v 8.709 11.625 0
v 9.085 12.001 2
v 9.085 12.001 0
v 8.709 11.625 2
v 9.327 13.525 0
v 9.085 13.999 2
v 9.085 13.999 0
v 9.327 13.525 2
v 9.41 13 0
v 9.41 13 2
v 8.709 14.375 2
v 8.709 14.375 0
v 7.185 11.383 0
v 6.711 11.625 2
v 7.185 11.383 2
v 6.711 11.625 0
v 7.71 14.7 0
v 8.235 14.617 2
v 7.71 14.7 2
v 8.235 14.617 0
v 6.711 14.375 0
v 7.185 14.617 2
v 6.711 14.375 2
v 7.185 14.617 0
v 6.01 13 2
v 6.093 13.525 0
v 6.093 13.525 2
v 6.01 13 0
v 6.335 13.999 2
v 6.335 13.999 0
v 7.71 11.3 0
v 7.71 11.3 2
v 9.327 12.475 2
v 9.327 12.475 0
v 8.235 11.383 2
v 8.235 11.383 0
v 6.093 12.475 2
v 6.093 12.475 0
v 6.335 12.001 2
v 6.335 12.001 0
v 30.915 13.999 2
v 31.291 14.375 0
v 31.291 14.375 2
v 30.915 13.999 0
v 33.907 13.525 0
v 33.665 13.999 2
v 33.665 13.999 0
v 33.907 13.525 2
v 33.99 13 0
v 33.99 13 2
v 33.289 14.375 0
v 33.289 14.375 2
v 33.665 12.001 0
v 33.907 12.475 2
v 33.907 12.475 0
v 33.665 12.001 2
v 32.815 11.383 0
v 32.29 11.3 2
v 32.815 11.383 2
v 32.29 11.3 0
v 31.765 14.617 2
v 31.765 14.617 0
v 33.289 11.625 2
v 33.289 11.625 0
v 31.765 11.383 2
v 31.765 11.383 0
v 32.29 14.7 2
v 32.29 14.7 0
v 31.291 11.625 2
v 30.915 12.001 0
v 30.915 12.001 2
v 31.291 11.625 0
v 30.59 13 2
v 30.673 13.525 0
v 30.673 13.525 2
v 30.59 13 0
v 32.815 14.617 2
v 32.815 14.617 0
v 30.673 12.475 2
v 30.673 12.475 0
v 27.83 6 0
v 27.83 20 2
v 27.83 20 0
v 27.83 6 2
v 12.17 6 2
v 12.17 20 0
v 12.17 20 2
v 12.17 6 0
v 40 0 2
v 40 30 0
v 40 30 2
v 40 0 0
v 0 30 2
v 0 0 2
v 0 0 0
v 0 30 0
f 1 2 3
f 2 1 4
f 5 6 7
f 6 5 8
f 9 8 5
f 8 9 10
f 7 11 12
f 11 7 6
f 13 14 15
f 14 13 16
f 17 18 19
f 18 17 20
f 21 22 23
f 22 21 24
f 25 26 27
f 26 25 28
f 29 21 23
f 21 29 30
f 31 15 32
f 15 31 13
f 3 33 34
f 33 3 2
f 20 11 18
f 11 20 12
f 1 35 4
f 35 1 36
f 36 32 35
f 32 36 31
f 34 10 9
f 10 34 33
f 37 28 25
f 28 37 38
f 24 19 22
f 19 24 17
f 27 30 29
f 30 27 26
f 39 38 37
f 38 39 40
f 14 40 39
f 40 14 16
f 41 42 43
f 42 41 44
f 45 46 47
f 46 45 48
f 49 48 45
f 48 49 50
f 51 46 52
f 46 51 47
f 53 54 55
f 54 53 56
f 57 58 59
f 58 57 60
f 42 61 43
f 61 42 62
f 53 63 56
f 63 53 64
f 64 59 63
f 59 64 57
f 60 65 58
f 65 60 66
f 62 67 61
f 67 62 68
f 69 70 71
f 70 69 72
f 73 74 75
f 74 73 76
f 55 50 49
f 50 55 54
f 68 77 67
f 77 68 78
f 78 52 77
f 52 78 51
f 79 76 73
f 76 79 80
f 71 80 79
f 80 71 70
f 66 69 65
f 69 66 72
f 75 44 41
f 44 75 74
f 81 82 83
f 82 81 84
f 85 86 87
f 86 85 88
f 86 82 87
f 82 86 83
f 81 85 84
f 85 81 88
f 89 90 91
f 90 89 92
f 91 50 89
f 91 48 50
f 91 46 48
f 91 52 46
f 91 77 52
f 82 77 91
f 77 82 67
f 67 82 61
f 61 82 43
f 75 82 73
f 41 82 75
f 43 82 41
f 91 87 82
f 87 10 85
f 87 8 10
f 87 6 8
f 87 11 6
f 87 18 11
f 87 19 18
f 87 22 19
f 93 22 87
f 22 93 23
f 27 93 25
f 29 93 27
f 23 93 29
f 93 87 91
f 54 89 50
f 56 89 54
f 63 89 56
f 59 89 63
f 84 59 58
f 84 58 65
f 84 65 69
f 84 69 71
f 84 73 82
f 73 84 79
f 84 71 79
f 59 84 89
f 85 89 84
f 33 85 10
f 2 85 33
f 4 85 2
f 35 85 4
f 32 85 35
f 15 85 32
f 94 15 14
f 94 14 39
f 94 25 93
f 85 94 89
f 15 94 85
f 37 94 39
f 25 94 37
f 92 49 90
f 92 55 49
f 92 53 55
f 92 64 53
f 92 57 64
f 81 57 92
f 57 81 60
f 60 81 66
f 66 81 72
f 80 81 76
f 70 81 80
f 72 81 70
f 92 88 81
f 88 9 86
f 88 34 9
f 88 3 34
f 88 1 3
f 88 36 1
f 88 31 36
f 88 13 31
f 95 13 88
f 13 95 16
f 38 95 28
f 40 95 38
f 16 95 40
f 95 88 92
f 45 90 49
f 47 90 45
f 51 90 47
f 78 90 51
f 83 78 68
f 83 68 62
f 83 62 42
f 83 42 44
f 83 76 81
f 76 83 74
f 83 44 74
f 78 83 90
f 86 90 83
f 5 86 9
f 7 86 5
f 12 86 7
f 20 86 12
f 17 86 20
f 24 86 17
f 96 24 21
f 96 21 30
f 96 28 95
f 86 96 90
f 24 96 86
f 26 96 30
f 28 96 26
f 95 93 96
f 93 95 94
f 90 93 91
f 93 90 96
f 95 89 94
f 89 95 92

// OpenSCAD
// file: bbs_switches.scad
//-------------------------------------------------------------------------------------
// Model for a SPDT switch from AdaFruit (Product ID 3221)
//
// The switch module can be used for checking for interferance.
// The cutout module is to be used for making a hole for mounting the switch in a panel.
//

module bbs_spdt_switch()
{
    translate([-13/2, -7.88/2, -9.56]) difference()
    {
        union()
        {
            cube([13, 7.88, 9.56]);
            translate([1.59, 2.17, -3.75]) cube([0.73, 7.88-2.17*2, 3.75]);
            translate([6.5, 2.17, -3.75]) cube([0.73, 7.88-2.17*2, 3.75]);
            translate([11.09, 2.17, -3.75]) cube([0.73, 7.88-2.17*2, 3.75]);
            translate([13/2, 7.88/2, 9.56]) cylinder(h=8.79, r=5.72/2);
            translate([13/2, 7.88/2, 9.56 + 1]) cylinder(h=0.65, r=11.97/2);
            translate([13/2, 7.88/2, 9.56+8.79]) cylinder(h=9.86, r=2.95/2);
        }
        union()
        {
            translate([13.2/2-5.72/2, 7.88/2-0.55/2, 9.56]) cube([0.1, .55, 8.79]);
        }
    }
}

module bbs_spdt_switch_cutout(height)
{
    difference()
    {
        translate([0, 0, -1.0]) cylinder(h=height + 1, r=5.75/2 + 0.1, $fn=20);
        translate([-5.75/2 - 0.2, -0.55/2, -2.0]) cube([0.3, 0.55/2, height + 4]);
    }
}

//-------------------------------------------------------------------------------------
// Model for an 8-way rotary switch AdaFruit (Product ID 2925)
// Connectors are not included in the model, but extend 4.32mm from the base.
//
module bbs_sp8t_switch()
{
    union()
    {
        cylinder(r=8.82/2, h=7.34);
        cylinder(r=5.85/2, h=15.53);
        translate([0, 0, -9.26]) cylinder(r=15.94/2, h=9.26);
        translate([15.94/2 - 1.05, -1, 0]) cube([1.05, 2, 1.8]);
    }
}
//
// The cutout is a little unusual as it also includes a cutout for a tab
// to keep the switch from rotating.  It's size will probably need to be
// adjusted so that it will fit.  Also, logic could be added to limit
// its height to that of the actual tab, about 1.8mm.
//
module bbs_sp8t_switch_cutout(height)
{
    union()
    {
        cylinder(r=9.02/2, h=height);
        translate([15.94/2 - 1.05, -1, 0]) cube([1.05, 2, height]);
    }
}

bbs_spdt_switch();
translate([0, 20, 0]) bbs_sp8t_switch();

translate([15, 0, 0]) bbs_spdt_switch_cutout(2);
translate([15, 20, 0]) bbs_sp8t_switch_cutout(2);
// file: bbs_connectors.scad
//
// This is a collection of connector cutouts for panels.
//

//--------------------------------------------------------------------------------------
// Dimensions for D-Sub connectors from http://www.interfacebus.com/Connector_D-Sub_Mechanical_Dimensions.html
// Since the cutouts are intended for either gender connector and since 3-D printer holes tend to be a little
// smaller than specified, the maximum tolerance sizes are used.  These may be tweaked if they turn out to
// still be a little too small.
//
// The coordinate origin is at the center of the connector.
//
// The dimensions of interest are:
// C - Distance between mounting holes.  The connector is assumed to be centered between them
// H - Horizontal size of cutout
// J - Vertical size of cutout
//
// Other dimensions that don't depend on the specific connector:
// Corner radius - 0.062 inches
// Screw hole size - 0.125 inches
//
// Dimension table
// Size   C      H      J
//   1  24.87  19.53  10.97
//   2  33.45  27.76  10.97
//   3  47.17  41.53  10.97
//   4  63.63  57.96  10.97
//   5  61.24  55.58  13.82
//   6  63.63  58.72  15.39
//
// Pins per connector
// Size  Standard  Dense
//    1     9        15
//    2    15        26
//    3    25        44
//    4    37        62
//    5    50        78
//    6   104       n/a
//
module bbs_d_cutout(size, height)
{
    if ((size < 1) || (size > 6))
    {
        echo("bbs_connectors.scad Invalid size given for D-sub connector ", size);
//        assert(false); // Assert may not be supported yet
    }
    screw_rad = 0.125 * 25.4/2;
    corner_rad = 0.063 * 25.4;
    c_sizes = [24.87, 33.45, 47.17, 63.63, 61.24, 63.63];
    h_sizes = [19.53, 27.76, 41.53, 57.96, 55.59, 58.72];
    j_sizes = [10.97, 10.97, 10.97, 10.97, 13.82, 15.39];
    size_c = c_sizes[size - 1];
    size_h = h_sizes[size - 1] + 1.0;
    size_j = j_sizes[size - 1] + 1.0;
    union()
    {
        translate([-size_c/2, 0, 0]) cylinder(r = screw_rad, h = height, $fn=20);
        translate([size_c/2, 0, 0]) cylinder(r = screw_rad, h = height, $fn=20);
        minkowski()
        {
            linear_extrude(height = height/2)
                polygon(points=[[-size_h/2+corner_rad, -size_j/2+corner_rad],
                    [size_h/2-corner_rad, -size_j/2+corner_rad], 
                    [size_h/2-corner_rad-sin(10)*size_j, size_j/2-corner_rad],
                    [-size_h/2+corner_rad+sin(10)*size_j, size_j/2-corner_rad]]);
            cylinder(r=corner_rad, h=height/2, $fn=20);
        }
    }
}

//--------------------------------------------------------------------------------------
//  These are like bannana connectors, but are a smaller diameter.  I have a bag of them
// from some unknown source.  I did find them at Digi-Key - search for tip connectors.
// As with most things at Digi-Key, there is a bewildering variaty of them and you will
// need to narrow down just what you need.  These are also cheaper than bannana connectors,
// which is probably why I have a bag of them.
//
module bbs_tip_connector()
{
    union()
    {
        cylinder(r=9.41/2, h=4.8);
        translate([0, 0, -14.19]) cylinder(r=6.22/2, h=14.19);
        translate([0, 0, -21.83]) cylinder(r=2.35/2, h=21.83);
    }
}

module bbs_tip_connector_cutout(height)
{
    intersection()
    {
        cylinder(r=6.32/2, h=height, $fn=20);
        translate([-6.32/2, -5.4/2, 0]) cube([6.32, 5.4, height]);
    }
}

//--------------------------------------------------------------------------------------
// Models and cutouts for Bannana jacks.  These are ubiquitous in lab equipment.
//
module bbs_bannana_connector()
{
    union()
    {
        cylinder(r=11.15/2, h=4.7);
        translate([0, 0, -11.91]) cylinder(r=7.78/2, h=11.91);
        translate([0, 0, -19.16]) cylinder(r=4.73/2, h=19.16);
    }
}

module bbs_bannana_connector_cutout(height)
{
    radius=8.07/2;
    width=6.3;
    intersection()
    {
        cylinder(r=radius, h=height, $fn=20);
        translate([-radius, -width/2, 0]) cube([radius*2, width, height]);
    }
}

//--------------------------------------------------------------------------------------
// This is a cutout for a panel mounted Rj45 connector - AdaFruit part number 909
//

module bbs_rj45_panel_cutout(height)
{
    radius = 3.4/2;
    width = 15.66;
    offset = 2.76 + radius + width/2;
    tall = 14.00;
    union()
    {
        translate([-offset, 0, 0]) cylinder(r=radius, h = height, $fn=20);
        translate([offset, 0, 0]) cylinder(r=radius, h = height, $fn=20);
        translate([-width/2, -tall/2, 0]) cube([width, tall, height]);
    }
}

//--------------------------------------------------------------------------------------
bbs_d_cutout(1, 2);
translate([0, 15, 0]) bbs_tip_connector_cutout(2);
translate([10, 15, 0]) bbs_tip_connector();
translate([0, 30, 0]) bbs_bannana_connector_cutout(2);
translate([10, 30, 0]) bbs_bannana_connector();
translate([0, 45, 0]) bbs_rj45_panel_cutout(2);
// main file
//
// Test coupon
//
use <bbs_connectors.scad>
use <bbs_switches.scad>

module coupon()
{
    difference()
    {
        cube([40, 30, 2]);
        union()
        {
            translate([20, 13, -0.1]) bbs_rj45_panel_cutout(2.2);
//            translate([10, 23, -0.1]) bbs_bannana_connector_cutout(2.2);
        }
    }
}

coupon();
